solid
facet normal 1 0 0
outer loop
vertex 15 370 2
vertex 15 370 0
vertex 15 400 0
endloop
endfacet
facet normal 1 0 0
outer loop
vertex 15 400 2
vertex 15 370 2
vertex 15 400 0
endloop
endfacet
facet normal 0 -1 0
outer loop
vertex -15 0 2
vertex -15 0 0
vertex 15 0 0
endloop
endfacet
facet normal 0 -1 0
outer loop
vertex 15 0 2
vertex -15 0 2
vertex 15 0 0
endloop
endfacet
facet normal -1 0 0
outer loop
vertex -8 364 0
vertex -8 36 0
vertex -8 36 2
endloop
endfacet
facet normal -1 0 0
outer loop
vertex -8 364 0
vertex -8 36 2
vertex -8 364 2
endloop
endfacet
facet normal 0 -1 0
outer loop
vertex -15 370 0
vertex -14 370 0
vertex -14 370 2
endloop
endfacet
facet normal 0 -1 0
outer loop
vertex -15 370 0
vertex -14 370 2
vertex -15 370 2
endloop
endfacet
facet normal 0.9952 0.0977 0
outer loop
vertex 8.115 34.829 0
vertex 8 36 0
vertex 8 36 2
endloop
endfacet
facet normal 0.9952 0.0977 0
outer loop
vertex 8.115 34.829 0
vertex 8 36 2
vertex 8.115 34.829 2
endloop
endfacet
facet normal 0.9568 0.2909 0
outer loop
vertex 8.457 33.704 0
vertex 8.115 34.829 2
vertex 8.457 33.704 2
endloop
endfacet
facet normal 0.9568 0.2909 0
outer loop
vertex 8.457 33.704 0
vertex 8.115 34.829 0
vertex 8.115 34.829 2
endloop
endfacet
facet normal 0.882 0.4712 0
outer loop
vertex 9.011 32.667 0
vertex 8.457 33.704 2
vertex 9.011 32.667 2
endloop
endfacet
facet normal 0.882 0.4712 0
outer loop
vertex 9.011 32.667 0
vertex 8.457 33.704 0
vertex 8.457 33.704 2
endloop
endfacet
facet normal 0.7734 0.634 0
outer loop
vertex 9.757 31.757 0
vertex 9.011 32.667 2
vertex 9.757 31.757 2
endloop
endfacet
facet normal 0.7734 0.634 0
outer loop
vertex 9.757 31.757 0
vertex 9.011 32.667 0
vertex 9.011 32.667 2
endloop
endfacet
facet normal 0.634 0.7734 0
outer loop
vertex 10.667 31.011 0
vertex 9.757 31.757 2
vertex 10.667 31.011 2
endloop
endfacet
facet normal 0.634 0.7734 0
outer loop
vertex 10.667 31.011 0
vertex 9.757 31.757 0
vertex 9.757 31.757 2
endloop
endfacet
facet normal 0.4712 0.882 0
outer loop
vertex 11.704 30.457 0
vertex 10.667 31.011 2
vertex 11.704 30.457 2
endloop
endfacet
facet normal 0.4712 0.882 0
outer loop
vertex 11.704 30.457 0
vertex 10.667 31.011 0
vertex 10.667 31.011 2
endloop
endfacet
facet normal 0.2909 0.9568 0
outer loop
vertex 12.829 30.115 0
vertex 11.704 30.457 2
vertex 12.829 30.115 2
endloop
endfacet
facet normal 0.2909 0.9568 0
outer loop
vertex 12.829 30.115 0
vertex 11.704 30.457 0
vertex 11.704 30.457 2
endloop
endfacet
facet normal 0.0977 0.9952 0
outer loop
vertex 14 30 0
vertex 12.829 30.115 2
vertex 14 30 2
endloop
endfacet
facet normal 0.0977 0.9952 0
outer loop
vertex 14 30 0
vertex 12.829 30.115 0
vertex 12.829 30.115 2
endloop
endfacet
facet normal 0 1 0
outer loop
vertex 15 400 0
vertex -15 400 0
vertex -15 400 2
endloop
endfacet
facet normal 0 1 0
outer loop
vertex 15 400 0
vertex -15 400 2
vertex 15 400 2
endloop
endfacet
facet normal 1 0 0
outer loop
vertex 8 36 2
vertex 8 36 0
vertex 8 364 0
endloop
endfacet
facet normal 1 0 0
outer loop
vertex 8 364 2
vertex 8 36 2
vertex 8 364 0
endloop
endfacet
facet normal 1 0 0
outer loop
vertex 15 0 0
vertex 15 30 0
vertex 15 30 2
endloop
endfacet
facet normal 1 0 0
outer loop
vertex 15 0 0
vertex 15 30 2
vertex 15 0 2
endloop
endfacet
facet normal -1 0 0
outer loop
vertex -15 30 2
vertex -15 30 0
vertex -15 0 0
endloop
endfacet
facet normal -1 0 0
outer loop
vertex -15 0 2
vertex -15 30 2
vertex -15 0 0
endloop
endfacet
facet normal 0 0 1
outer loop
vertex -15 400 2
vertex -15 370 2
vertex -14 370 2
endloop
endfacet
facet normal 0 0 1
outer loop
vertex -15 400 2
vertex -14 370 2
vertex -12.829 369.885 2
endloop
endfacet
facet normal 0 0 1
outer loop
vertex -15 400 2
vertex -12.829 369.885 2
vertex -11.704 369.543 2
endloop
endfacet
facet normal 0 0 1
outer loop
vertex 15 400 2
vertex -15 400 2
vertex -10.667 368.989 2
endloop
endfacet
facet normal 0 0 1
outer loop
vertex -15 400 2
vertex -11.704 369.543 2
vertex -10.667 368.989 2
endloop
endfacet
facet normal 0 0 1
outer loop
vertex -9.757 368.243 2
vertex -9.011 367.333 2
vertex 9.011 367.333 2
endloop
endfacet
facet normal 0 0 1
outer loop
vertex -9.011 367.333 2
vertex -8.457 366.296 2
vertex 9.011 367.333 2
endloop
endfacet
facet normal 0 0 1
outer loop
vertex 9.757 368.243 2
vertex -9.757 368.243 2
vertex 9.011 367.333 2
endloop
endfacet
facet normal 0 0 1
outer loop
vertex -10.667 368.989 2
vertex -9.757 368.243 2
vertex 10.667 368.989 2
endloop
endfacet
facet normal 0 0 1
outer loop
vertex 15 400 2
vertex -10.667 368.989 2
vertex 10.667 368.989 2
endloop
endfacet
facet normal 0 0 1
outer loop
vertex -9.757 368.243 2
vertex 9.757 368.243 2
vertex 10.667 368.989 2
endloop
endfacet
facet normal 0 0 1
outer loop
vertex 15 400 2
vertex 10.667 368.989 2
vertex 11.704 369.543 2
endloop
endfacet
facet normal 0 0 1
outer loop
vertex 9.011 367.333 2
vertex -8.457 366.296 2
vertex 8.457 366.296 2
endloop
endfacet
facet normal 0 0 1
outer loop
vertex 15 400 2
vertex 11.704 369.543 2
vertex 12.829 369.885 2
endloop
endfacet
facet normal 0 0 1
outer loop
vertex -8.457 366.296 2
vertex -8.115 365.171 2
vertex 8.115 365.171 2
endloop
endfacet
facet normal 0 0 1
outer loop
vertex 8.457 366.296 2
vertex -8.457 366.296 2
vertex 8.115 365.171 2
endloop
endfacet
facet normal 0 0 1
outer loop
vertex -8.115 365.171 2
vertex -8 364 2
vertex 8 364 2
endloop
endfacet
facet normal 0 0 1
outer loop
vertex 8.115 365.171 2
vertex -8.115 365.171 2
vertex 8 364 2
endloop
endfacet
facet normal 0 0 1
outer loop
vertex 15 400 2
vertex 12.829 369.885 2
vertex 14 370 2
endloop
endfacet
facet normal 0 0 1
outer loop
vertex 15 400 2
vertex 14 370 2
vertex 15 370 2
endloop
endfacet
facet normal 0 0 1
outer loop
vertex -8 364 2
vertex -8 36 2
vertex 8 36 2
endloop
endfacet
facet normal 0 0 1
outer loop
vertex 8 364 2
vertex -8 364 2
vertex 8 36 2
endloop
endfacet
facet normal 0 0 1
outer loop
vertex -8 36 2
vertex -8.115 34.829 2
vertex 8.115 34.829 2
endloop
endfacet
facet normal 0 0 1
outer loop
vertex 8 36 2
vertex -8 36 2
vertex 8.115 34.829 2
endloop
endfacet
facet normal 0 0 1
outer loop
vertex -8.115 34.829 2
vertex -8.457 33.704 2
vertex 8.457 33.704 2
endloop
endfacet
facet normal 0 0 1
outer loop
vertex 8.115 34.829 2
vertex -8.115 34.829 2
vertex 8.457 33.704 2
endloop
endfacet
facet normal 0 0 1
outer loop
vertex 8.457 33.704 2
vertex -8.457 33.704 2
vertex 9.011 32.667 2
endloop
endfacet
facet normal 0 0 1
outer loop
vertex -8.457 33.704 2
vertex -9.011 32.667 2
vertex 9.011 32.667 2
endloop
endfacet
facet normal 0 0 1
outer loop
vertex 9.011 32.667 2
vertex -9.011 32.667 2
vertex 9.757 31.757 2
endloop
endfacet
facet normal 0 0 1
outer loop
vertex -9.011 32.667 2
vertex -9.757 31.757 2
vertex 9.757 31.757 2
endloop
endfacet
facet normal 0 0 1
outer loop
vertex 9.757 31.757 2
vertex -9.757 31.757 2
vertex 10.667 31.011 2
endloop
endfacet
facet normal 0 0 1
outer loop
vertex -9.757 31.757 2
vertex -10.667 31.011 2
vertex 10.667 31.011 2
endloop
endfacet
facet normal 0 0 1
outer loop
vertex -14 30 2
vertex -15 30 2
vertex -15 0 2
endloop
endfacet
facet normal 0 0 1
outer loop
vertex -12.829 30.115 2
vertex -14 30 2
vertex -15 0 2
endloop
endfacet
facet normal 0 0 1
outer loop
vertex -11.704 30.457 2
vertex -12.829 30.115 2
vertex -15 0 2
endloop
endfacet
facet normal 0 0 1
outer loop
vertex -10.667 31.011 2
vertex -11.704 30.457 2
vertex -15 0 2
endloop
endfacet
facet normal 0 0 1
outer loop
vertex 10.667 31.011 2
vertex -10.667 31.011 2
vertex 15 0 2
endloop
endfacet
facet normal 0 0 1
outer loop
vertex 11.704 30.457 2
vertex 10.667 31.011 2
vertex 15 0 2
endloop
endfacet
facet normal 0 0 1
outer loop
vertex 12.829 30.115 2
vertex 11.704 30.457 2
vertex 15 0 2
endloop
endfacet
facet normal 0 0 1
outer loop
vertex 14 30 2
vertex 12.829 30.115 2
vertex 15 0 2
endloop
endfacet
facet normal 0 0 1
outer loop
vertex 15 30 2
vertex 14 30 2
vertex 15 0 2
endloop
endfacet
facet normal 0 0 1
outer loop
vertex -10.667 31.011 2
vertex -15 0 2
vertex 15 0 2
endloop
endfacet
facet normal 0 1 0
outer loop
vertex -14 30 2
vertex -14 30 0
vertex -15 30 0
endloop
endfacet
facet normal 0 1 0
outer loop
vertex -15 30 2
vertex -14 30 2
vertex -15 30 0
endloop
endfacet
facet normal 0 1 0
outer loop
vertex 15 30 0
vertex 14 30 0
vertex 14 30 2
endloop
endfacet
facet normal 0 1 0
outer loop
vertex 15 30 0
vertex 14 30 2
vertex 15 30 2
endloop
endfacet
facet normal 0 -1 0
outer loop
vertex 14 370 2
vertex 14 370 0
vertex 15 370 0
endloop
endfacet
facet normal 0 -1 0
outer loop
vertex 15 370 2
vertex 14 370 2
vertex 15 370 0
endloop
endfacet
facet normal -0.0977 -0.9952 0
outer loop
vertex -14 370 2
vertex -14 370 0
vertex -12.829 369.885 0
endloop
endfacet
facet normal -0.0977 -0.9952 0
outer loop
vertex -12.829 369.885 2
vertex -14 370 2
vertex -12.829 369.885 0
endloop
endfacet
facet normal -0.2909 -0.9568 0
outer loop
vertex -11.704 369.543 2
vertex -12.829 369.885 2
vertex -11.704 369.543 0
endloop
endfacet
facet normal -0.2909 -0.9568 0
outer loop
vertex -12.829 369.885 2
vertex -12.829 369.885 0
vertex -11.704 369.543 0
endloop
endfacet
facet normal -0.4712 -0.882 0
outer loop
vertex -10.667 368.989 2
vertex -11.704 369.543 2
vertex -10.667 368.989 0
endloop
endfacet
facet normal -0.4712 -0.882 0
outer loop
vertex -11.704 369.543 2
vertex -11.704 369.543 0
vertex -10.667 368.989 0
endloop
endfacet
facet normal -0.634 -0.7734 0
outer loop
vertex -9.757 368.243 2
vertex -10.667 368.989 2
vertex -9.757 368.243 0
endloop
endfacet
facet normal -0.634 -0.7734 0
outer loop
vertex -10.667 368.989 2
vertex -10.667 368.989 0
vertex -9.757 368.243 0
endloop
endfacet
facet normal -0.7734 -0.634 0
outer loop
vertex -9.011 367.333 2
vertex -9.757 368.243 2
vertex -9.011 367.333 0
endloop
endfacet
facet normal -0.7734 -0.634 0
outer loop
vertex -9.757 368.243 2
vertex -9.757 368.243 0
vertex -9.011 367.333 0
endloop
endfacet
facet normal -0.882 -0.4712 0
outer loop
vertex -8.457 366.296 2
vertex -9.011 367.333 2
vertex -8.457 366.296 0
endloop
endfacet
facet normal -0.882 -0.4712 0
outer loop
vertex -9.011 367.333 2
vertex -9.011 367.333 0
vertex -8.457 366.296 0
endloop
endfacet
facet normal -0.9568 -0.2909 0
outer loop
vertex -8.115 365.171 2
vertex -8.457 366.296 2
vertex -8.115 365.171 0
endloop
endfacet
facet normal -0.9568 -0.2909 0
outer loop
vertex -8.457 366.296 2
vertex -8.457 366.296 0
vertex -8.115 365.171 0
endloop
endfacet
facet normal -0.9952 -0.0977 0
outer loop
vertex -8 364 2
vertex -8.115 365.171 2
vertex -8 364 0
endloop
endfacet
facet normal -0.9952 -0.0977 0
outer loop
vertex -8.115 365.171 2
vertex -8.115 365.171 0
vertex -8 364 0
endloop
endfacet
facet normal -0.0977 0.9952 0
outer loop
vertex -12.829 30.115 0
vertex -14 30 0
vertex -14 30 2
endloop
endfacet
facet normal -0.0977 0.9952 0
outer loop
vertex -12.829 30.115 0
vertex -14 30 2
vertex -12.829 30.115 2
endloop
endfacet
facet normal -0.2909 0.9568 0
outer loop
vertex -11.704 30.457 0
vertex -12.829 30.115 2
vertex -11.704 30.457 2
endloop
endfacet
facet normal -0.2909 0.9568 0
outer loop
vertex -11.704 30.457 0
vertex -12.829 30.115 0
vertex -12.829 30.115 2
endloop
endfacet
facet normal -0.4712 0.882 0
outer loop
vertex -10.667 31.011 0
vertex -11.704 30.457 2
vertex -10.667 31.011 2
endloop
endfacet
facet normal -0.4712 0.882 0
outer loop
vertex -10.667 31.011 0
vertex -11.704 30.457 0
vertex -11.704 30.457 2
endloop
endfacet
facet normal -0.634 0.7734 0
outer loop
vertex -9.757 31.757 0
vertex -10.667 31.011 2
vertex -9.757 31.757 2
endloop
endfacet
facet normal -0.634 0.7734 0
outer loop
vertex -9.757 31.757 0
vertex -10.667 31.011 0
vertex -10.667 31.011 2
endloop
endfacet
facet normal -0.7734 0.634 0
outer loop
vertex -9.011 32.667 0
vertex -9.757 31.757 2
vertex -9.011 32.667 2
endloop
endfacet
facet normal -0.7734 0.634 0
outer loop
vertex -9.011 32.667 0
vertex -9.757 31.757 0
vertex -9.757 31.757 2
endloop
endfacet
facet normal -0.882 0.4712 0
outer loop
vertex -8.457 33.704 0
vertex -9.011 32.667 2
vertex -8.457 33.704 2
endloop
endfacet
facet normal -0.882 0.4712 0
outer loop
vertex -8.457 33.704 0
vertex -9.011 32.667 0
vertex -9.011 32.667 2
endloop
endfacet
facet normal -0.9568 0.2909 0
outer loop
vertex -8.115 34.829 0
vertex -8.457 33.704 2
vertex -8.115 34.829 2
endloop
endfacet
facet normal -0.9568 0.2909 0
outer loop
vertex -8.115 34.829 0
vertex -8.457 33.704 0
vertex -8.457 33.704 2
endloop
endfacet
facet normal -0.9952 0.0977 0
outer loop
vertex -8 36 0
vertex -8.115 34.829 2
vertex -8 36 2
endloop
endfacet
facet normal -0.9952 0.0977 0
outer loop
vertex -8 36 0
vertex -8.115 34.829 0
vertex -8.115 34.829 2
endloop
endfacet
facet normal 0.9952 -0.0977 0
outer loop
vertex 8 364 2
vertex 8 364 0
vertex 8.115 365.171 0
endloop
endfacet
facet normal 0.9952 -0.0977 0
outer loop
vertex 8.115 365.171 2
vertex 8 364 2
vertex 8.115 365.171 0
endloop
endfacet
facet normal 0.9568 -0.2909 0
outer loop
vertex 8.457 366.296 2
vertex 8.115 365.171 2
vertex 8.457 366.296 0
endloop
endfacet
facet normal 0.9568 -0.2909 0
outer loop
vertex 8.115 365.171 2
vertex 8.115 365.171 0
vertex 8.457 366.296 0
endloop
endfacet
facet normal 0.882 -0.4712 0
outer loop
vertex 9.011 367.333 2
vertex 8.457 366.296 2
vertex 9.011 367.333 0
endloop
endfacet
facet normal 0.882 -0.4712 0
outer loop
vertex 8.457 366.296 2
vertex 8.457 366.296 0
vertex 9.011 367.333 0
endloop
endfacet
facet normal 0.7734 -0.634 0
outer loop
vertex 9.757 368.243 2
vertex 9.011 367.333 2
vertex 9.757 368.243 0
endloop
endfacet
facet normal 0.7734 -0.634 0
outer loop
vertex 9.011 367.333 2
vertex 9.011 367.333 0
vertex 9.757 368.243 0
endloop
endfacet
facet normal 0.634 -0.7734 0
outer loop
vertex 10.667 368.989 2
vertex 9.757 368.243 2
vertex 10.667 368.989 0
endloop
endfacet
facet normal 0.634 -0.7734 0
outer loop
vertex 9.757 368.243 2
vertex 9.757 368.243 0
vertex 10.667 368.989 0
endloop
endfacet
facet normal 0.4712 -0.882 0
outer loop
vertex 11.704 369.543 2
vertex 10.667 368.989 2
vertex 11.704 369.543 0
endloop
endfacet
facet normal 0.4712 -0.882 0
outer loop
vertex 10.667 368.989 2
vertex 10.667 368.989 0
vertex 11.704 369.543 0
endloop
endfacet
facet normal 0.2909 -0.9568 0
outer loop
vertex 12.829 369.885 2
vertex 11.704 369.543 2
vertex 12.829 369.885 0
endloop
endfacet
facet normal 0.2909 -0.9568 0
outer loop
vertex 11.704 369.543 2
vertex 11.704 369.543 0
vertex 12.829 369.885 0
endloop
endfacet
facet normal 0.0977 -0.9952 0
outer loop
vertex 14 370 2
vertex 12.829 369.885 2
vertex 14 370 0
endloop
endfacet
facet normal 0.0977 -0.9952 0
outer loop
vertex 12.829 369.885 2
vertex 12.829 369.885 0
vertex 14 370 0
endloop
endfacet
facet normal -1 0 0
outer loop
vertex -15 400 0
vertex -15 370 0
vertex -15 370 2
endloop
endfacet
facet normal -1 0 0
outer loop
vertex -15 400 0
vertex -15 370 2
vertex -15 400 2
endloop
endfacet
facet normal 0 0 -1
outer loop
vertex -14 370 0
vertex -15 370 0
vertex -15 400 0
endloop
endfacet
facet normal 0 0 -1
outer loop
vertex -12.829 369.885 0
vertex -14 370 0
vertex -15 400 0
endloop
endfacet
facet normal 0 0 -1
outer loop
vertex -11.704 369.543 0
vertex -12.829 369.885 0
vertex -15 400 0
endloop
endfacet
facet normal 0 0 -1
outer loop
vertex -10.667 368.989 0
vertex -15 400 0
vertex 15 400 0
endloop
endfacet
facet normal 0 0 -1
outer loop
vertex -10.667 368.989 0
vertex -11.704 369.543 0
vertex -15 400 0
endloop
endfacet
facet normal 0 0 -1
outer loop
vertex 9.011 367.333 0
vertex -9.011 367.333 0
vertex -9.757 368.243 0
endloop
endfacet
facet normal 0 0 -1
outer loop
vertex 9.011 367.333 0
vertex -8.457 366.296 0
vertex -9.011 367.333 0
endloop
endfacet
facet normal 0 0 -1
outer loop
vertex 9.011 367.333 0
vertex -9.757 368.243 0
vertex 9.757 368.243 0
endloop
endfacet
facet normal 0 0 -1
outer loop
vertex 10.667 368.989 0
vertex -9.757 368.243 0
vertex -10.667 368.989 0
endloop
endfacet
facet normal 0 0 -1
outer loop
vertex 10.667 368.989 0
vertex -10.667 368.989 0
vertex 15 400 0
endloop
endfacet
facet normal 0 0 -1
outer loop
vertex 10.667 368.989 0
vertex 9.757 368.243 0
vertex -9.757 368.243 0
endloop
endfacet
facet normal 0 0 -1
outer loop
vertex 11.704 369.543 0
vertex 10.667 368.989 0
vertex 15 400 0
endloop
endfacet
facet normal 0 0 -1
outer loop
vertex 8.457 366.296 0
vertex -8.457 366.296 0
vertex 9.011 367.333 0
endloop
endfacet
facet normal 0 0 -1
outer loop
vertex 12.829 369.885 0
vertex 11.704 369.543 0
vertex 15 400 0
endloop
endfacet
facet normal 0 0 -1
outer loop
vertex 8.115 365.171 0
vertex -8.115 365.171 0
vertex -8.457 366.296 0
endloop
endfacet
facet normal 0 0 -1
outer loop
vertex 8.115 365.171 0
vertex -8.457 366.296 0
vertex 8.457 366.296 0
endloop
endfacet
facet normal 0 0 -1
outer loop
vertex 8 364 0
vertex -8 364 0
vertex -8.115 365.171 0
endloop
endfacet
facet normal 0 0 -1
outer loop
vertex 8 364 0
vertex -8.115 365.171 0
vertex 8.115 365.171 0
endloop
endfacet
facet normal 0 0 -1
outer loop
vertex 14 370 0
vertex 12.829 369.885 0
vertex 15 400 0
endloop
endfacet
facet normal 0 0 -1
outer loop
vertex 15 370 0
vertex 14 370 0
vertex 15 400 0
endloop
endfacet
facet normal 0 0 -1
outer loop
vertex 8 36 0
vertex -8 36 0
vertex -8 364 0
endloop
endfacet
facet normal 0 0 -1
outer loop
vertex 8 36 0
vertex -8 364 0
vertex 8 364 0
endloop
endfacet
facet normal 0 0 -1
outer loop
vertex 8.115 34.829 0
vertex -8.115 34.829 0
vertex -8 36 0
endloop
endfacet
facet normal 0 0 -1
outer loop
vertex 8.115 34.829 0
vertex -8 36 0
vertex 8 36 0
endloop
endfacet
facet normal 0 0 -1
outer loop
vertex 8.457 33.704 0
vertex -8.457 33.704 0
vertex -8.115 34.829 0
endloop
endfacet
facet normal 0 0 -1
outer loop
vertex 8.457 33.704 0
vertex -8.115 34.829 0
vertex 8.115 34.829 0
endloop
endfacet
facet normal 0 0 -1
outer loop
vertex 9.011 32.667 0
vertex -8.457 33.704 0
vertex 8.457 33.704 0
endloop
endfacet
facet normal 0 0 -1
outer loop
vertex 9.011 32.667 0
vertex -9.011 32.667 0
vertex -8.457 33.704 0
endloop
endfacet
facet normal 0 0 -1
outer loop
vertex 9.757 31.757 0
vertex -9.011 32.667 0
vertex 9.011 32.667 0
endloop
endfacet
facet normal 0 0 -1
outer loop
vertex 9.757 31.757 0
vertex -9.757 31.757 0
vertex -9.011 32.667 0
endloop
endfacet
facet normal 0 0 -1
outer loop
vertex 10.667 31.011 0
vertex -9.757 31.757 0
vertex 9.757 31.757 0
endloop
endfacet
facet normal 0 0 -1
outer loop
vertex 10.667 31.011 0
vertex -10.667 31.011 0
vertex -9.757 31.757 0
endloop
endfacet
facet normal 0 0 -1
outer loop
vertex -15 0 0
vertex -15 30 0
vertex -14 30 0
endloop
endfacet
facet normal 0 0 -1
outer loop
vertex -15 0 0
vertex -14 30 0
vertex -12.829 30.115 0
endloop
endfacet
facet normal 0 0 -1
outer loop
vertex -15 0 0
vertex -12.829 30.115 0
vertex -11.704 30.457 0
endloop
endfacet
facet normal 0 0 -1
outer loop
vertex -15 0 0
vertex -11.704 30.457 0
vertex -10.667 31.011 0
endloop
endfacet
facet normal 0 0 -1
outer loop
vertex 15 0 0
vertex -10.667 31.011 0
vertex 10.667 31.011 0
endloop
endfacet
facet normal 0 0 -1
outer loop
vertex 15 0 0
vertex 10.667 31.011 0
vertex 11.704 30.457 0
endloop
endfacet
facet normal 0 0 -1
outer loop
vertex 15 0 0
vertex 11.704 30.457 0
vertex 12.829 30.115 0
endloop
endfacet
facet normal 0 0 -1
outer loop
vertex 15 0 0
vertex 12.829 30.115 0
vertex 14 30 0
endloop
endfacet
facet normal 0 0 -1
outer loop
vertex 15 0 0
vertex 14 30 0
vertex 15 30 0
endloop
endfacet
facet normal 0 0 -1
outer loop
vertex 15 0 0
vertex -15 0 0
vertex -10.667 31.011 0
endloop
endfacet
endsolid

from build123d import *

# Parameters (mm, degrees)
PAD_DEPTH = 2


with BuildPart() as part:
    # Sketch → Pad (new body)
    with BuildSketch(Plane.XY):
        with BuildLine():
            Line((0, 0), (15, 0))
            Line((15, 30), (15, 0))
            Line((14, 30), (15, 30))
            ThreePointArc((8, 36), (9.757359, 31.757359), (14, 30))
            Line((8, 200), (8, 36))
            Line((0, 200), (8, 200))
            Line((0, 200), (-8, 200))
            Line((-8, 200), (-8, 36))
            ThreePointArc((-14, 30), (-9.757359, 31.757359), (-8, 36))
            Line((-14, 30), (-15, 30))
            Line((-15, 30), (-15, 0))
            Line((0, 0), (-15, 0))
        make_face()
    pad = extrude(amount=PAD_DEPTH)

    # Mirrored: Pad across face of Pad
    add(pad.mirror(Plane(origin=(4, 200, 1), x_dir=(-1, 0, 0), z_dir=(0, 1, 0))))


solid = part.part
